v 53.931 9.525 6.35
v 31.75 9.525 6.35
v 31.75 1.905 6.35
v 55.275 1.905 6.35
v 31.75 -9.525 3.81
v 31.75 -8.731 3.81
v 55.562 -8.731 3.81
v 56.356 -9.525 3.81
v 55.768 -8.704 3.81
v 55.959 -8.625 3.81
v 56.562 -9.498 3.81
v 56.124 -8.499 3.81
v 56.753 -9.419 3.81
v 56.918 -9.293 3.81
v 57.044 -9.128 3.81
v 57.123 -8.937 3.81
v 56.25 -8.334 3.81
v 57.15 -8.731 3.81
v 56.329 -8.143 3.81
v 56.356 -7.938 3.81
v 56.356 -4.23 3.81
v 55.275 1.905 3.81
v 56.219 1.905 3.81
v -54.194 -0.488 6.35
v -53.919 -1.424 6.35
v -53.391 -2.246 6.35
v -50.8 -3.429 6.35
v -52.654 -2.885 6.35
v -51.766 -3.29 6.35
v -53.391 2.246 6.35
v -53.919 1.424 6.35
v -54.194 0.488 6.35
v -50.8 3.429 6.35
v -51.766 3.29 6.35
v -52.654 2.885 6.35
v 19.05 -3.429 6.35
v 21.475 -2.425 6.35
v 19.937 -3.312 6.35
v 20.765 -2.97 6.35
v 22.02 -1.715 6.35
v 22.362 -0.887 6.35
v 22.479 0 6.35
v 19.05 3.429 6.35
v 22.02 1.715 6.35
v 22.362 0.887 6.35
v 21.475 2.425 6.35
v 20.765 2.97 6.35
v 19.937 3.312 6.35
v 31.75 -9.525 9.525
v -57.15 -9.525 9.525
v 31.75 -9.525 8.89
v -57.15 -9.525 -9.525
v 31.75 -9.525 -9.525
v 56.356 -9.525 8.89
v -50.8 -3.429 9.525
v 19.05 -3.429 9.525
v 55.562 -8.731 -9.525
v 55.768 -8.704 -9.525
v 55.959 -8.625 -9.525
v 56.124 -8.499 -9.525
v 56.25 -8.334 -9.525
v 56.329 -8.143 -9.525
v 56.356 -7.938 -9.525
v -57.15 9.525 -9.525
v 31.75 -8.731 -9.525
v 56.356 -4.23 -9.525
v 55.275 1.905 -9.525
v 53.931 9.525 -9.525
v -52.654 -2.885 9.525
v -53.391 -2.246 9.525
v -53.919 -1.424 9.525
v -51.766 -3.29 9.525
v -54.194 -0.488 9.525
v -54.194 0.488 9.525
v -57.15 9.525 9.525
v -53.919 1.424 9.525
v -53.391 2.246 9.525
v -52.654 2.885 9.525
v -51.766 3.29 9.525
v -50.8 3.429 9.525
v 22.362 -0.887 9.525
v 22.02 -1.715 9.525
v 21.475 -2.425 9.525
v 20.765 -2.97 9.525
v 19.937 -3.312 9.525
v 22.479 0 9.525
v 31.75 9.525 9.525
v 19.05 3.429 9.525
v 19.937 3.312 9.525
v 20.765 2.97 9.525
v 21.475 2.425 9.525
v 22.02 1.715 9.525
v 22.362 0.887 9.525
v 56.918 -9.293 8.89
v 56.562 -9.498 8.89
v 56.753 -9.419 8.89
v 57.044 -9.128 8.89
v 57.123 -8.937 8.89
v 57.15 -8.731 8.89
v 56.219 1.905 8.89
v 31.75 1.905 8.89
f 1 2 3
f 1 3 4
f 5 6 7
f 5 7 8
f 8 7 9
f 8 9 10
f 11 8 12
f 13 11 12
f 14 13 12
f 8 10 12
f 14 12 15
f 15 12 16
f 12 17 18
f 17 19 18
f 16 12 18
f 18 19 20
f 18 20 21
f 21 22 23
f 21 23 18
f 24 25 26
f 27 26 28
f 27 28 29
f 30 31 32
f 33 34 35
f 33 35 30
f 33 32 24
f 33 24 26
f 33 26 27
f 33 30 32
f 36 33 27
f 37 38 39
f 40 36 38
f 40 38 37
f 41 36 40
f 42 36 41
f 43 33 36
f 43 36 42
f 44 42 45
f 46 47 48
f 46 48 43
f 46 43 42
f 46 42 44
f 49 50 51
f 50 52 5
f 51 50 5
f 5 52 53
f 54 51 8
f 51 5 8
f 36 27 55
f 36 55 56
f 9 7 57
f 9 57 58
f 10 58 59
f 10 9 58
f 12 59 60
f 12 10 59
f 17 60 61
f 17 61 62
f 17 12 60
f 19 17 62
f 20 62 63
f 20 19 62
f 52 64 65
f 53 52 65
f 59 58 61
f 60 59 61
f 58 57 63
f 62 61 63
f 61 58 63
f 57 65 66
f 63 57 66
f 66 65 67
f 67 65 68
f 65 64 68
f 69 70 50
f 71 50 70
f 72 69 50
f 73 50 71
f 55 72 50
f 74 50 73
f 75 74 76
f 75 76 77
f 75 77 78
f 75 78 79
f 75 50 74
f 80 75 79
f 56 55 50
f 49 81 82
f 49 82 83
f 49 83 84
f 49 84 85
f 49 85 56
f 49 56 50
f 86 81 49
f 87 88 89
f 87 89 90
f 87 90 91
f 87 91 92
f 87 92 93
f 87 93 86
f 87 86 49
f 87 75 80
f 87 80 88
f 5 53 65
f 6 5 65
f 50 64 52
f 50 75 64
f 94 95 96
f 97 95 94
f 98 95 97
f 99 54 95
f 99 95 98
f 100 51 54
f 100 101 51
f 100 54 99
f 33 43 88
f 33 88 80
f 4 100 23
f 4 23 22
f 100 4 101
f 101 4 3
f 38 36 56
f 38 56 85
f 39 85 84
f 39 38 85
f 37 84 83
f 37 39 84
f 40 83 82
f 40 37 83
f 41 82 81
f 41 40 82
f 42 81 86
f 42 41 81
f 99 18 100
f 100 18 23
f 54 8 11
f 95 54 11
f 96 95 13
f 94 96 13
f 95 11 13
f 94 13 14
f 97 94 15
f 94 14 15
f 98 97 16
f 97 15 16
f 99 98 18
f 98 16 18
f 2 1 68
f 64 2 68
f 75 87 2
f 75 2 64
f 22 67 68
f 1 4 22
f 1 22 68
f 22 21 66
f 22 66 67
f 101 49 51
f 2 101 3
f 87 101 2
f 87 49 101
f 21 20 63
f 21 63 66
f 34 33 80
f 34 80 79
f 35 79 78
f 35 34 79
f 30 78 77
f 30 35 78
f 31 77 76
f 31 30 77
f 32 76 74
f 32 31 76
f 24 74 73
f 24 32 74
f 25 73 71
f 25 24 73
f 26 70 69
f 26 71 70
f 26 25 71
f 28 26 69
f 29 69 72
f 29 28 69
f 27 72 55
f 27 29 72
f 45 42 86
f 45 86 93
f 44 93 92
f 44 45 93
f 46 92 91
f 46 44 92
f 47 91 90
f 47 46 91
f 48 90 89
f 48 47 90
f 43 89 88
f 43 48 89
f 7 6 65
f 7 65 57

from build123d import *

# Parameters (mm, degrees)
F1_DEPTH = 9.525
F2_START = 6.35
F2_DEPTH = 6.35
F3_START = 3.81
F3_DEPTH = 5.08


with BuildPart() as f1:
    # F0 (on Top) → F1 (new body, symmetric)
    with BuildSketch(Plane.XY):
        Polygon((-57.15, 9.525), (-57.15, -9.525), (31.75, -9.525), (31.75, -8.73125), (31.75, 1.905), (31.75, 9.525), align=None)
        with BuildLine():
            ThreePointArc((-50.8, -3.429), (-54.229, 0), (-50.8, 3.429))
            Line((-50.8, 3.429), (19.05, 3.429))
            ThreePointArc((19.05, 3.429), (21.4746691527, 2.4246691527), (22.479, 0))
            ThreePointArc((22.479, 0), (21.4746691527, -2.4246691527), (19.05, -3.429))
            Line((19.05, -3.429), (-50.8, -3.429))
        make_face(mode=Mode.SUBTRACT)
        with BuildLine():
            Line((31.75, 1.905), (31.75, -8.73125))
            Line((31.75, -8.73125), (55.5625, -8.73125))
            ThreePointArc((55.5625, -8.73125), (56.1237660076, -8.4987660076), (56.35625, -7.9375))
            Line((56.35625, -7.9375), (56.35625, -4.2296700557))
            Line((56.35625, -4.2296700557), (55.2745421514, 1.905))
            Line((55.2745421514, 1.905), (31.75, 1.905))
        make_face()
        Polygon((53.9309305584, 9.525), (31.75, 9.525), (31.75, 1.905), (55.2745421514, 1.905), align=None)
        with BuildLine():
            ThreePointArc((-50.8, -3.429), (-48.3753308473, -2.4246691527), (-47.371, 0))
            ThreePointArc((-47.371, 0), (-48.3753308473, 2.4246691527), (-50.8, 3.429))
            ThreePointArc((-50.8, 3.429), (-54.229, 0), (-50.8, -3.429))
        make_face()
        with BuildLine():
            ThreePointArc((-50.8, 3.429), (-48.3753308473, 2.4246691527), (-47.371, 0))
            ThreePointArc((-47.371, 0), (-48.3753308473, -2.4246691527), (-50.8, -3.429))
            Line((-50.8, -3.429), (19.05, -3.429))
            ThreePointArc((19.05, -3.429), (15.621, 0), (19.05, 3.429))
            Line((19.05, 3.429), (-50.8, 3.429))
        make_face()
        with BuildLine():
            ThreePointArc((22.479, 0), (21.4746691527, 2.4246691527), (19.05, 3.429))
            ThreePointArc((19.05, 3.429), (15.621, 0), (19.05, -3.429))
            ThreePointArc((19.05, -3.429), (21.4746691527, -2.4246691527), (22.479, 0))
        make_face()
    extrude(amount=F1_DEPTH, both=True)

    # F0 (on Top) → F2 (cut)
    with BuildSketch(Plane.XY.offset(F2_START)):
        with BuildLine():
            Line((31.75, 1.905), (31.75, -8.73125))
            Line((31.75, -8.73125), (55.5625, -8.73125))
            ThreePointArc((55.5625, -8.73125), (56.1237660076, -8.4987660076), (56.35625, -7.9375))
            Line((56.35625, -7.9375), (56.35625, -4.2296700557))
            Line((56.35625, -4.2296700557), (55.2745421514, 1.905))
            Line((55.2745421514, 1.905), (31.75, 1.905))
        make_face()
        Polygon((53.9309305584, 9.525), (31.75, 9.525), (31.75, 1.905), (55.2745421514, 1.905), align=None)
        with BuildLine():
            ThreePointArc((-50.8, -3.429), (-48.3753308473, -2.4246691527), (-47.371, 0))
            ThreePointArc((-47.371, 0), (-48.3753308473, 2.4246691527), (-50.8, 3.429))
            ThreePointArc((-50.8, 3.429), (-54.229, 0), (-50.8, -3.429))
        make_face()
        with BuildLine():
            ThreePointArc((-50.8, 3.429), (-48.3753308473, 2.4246691527), (-47.371, 0))
            ThreePointArc((-47.371, 0), (-48.3753308473, -2.4246691527), (-50.8, -3.429))
            Line((-50.8, -3.429), (19.05, -3.429))
            ThreePointArc((19.05, -3.429), (15.621, 0), (19.05, 3.429))
            Line((19.05, 3.429), (-50.8, 3.429))
        make_face()
        with BuildLine():
            ThreePointArc((22.479, 0), (21.4746691527, 2.4246691527), (19.05, 3.429))
            ThreePointArc((19.05, 3.429), (15.621, 0), (19.05, -3.429))
            ThreePointArc((19.05, -3.429), (21.4746691527, -2.4246691527), (22.479, 0))
        make_face()
    extrude(amount=F2_DEPTH, mode=Mode.SUBTRACT)

    # F0 (on Top) → F3 (join)
    with BuildSketch(Plane.XY.offset(F3_START)):
        with BuildLine():
            Line((31.75, -8.73125), (31.75, -9.525))
            Line((31.75, -9.525), (56.35625, -9.525))
            ThreePointArc((56.35625, -9.525), (56.9175160076, -9.2925160076), (57.15, -8.73125))
            Line((57.15, -8.73125), (56.35625, -4.2296700557))
            Line((56.35625, -4.2296700557), (56.35625, -7.9375))
            ThreePointArc((56.35625, -7.9375), (56.1237660076, -8.4987660076), (55.5625, -8.73125))
            Line((55.5625, -8.73125), (31.75, -8.73125))
        make_face()
        with BuildLine():
            Line((31.75, 1.905), (31.75, -8.73125))
            Line((31.75, -8.73125), (55.5625, -8.73125))
            ThreePointArc((55.5625, -8.73125), (56.1237660076, -8.4987660076), (56.35625, -7.9375))
            Line((56.35625, -7.9375), (56.35625, -4.2296700557))
            Line((56.35625, -4.2296700557), (55.2745421514, 1.905))
            Line((55.2745421514, 1.905), (31.75, 1.905))
        make_face()
        Polygon((56.35625, -4.2296700557), (57.15, -8.73125), (56.2194487026, 1.905), (55.2745421514, 1.905), align=None)
    extrude(amount=F3_DEPTH)


solid = f1.part
